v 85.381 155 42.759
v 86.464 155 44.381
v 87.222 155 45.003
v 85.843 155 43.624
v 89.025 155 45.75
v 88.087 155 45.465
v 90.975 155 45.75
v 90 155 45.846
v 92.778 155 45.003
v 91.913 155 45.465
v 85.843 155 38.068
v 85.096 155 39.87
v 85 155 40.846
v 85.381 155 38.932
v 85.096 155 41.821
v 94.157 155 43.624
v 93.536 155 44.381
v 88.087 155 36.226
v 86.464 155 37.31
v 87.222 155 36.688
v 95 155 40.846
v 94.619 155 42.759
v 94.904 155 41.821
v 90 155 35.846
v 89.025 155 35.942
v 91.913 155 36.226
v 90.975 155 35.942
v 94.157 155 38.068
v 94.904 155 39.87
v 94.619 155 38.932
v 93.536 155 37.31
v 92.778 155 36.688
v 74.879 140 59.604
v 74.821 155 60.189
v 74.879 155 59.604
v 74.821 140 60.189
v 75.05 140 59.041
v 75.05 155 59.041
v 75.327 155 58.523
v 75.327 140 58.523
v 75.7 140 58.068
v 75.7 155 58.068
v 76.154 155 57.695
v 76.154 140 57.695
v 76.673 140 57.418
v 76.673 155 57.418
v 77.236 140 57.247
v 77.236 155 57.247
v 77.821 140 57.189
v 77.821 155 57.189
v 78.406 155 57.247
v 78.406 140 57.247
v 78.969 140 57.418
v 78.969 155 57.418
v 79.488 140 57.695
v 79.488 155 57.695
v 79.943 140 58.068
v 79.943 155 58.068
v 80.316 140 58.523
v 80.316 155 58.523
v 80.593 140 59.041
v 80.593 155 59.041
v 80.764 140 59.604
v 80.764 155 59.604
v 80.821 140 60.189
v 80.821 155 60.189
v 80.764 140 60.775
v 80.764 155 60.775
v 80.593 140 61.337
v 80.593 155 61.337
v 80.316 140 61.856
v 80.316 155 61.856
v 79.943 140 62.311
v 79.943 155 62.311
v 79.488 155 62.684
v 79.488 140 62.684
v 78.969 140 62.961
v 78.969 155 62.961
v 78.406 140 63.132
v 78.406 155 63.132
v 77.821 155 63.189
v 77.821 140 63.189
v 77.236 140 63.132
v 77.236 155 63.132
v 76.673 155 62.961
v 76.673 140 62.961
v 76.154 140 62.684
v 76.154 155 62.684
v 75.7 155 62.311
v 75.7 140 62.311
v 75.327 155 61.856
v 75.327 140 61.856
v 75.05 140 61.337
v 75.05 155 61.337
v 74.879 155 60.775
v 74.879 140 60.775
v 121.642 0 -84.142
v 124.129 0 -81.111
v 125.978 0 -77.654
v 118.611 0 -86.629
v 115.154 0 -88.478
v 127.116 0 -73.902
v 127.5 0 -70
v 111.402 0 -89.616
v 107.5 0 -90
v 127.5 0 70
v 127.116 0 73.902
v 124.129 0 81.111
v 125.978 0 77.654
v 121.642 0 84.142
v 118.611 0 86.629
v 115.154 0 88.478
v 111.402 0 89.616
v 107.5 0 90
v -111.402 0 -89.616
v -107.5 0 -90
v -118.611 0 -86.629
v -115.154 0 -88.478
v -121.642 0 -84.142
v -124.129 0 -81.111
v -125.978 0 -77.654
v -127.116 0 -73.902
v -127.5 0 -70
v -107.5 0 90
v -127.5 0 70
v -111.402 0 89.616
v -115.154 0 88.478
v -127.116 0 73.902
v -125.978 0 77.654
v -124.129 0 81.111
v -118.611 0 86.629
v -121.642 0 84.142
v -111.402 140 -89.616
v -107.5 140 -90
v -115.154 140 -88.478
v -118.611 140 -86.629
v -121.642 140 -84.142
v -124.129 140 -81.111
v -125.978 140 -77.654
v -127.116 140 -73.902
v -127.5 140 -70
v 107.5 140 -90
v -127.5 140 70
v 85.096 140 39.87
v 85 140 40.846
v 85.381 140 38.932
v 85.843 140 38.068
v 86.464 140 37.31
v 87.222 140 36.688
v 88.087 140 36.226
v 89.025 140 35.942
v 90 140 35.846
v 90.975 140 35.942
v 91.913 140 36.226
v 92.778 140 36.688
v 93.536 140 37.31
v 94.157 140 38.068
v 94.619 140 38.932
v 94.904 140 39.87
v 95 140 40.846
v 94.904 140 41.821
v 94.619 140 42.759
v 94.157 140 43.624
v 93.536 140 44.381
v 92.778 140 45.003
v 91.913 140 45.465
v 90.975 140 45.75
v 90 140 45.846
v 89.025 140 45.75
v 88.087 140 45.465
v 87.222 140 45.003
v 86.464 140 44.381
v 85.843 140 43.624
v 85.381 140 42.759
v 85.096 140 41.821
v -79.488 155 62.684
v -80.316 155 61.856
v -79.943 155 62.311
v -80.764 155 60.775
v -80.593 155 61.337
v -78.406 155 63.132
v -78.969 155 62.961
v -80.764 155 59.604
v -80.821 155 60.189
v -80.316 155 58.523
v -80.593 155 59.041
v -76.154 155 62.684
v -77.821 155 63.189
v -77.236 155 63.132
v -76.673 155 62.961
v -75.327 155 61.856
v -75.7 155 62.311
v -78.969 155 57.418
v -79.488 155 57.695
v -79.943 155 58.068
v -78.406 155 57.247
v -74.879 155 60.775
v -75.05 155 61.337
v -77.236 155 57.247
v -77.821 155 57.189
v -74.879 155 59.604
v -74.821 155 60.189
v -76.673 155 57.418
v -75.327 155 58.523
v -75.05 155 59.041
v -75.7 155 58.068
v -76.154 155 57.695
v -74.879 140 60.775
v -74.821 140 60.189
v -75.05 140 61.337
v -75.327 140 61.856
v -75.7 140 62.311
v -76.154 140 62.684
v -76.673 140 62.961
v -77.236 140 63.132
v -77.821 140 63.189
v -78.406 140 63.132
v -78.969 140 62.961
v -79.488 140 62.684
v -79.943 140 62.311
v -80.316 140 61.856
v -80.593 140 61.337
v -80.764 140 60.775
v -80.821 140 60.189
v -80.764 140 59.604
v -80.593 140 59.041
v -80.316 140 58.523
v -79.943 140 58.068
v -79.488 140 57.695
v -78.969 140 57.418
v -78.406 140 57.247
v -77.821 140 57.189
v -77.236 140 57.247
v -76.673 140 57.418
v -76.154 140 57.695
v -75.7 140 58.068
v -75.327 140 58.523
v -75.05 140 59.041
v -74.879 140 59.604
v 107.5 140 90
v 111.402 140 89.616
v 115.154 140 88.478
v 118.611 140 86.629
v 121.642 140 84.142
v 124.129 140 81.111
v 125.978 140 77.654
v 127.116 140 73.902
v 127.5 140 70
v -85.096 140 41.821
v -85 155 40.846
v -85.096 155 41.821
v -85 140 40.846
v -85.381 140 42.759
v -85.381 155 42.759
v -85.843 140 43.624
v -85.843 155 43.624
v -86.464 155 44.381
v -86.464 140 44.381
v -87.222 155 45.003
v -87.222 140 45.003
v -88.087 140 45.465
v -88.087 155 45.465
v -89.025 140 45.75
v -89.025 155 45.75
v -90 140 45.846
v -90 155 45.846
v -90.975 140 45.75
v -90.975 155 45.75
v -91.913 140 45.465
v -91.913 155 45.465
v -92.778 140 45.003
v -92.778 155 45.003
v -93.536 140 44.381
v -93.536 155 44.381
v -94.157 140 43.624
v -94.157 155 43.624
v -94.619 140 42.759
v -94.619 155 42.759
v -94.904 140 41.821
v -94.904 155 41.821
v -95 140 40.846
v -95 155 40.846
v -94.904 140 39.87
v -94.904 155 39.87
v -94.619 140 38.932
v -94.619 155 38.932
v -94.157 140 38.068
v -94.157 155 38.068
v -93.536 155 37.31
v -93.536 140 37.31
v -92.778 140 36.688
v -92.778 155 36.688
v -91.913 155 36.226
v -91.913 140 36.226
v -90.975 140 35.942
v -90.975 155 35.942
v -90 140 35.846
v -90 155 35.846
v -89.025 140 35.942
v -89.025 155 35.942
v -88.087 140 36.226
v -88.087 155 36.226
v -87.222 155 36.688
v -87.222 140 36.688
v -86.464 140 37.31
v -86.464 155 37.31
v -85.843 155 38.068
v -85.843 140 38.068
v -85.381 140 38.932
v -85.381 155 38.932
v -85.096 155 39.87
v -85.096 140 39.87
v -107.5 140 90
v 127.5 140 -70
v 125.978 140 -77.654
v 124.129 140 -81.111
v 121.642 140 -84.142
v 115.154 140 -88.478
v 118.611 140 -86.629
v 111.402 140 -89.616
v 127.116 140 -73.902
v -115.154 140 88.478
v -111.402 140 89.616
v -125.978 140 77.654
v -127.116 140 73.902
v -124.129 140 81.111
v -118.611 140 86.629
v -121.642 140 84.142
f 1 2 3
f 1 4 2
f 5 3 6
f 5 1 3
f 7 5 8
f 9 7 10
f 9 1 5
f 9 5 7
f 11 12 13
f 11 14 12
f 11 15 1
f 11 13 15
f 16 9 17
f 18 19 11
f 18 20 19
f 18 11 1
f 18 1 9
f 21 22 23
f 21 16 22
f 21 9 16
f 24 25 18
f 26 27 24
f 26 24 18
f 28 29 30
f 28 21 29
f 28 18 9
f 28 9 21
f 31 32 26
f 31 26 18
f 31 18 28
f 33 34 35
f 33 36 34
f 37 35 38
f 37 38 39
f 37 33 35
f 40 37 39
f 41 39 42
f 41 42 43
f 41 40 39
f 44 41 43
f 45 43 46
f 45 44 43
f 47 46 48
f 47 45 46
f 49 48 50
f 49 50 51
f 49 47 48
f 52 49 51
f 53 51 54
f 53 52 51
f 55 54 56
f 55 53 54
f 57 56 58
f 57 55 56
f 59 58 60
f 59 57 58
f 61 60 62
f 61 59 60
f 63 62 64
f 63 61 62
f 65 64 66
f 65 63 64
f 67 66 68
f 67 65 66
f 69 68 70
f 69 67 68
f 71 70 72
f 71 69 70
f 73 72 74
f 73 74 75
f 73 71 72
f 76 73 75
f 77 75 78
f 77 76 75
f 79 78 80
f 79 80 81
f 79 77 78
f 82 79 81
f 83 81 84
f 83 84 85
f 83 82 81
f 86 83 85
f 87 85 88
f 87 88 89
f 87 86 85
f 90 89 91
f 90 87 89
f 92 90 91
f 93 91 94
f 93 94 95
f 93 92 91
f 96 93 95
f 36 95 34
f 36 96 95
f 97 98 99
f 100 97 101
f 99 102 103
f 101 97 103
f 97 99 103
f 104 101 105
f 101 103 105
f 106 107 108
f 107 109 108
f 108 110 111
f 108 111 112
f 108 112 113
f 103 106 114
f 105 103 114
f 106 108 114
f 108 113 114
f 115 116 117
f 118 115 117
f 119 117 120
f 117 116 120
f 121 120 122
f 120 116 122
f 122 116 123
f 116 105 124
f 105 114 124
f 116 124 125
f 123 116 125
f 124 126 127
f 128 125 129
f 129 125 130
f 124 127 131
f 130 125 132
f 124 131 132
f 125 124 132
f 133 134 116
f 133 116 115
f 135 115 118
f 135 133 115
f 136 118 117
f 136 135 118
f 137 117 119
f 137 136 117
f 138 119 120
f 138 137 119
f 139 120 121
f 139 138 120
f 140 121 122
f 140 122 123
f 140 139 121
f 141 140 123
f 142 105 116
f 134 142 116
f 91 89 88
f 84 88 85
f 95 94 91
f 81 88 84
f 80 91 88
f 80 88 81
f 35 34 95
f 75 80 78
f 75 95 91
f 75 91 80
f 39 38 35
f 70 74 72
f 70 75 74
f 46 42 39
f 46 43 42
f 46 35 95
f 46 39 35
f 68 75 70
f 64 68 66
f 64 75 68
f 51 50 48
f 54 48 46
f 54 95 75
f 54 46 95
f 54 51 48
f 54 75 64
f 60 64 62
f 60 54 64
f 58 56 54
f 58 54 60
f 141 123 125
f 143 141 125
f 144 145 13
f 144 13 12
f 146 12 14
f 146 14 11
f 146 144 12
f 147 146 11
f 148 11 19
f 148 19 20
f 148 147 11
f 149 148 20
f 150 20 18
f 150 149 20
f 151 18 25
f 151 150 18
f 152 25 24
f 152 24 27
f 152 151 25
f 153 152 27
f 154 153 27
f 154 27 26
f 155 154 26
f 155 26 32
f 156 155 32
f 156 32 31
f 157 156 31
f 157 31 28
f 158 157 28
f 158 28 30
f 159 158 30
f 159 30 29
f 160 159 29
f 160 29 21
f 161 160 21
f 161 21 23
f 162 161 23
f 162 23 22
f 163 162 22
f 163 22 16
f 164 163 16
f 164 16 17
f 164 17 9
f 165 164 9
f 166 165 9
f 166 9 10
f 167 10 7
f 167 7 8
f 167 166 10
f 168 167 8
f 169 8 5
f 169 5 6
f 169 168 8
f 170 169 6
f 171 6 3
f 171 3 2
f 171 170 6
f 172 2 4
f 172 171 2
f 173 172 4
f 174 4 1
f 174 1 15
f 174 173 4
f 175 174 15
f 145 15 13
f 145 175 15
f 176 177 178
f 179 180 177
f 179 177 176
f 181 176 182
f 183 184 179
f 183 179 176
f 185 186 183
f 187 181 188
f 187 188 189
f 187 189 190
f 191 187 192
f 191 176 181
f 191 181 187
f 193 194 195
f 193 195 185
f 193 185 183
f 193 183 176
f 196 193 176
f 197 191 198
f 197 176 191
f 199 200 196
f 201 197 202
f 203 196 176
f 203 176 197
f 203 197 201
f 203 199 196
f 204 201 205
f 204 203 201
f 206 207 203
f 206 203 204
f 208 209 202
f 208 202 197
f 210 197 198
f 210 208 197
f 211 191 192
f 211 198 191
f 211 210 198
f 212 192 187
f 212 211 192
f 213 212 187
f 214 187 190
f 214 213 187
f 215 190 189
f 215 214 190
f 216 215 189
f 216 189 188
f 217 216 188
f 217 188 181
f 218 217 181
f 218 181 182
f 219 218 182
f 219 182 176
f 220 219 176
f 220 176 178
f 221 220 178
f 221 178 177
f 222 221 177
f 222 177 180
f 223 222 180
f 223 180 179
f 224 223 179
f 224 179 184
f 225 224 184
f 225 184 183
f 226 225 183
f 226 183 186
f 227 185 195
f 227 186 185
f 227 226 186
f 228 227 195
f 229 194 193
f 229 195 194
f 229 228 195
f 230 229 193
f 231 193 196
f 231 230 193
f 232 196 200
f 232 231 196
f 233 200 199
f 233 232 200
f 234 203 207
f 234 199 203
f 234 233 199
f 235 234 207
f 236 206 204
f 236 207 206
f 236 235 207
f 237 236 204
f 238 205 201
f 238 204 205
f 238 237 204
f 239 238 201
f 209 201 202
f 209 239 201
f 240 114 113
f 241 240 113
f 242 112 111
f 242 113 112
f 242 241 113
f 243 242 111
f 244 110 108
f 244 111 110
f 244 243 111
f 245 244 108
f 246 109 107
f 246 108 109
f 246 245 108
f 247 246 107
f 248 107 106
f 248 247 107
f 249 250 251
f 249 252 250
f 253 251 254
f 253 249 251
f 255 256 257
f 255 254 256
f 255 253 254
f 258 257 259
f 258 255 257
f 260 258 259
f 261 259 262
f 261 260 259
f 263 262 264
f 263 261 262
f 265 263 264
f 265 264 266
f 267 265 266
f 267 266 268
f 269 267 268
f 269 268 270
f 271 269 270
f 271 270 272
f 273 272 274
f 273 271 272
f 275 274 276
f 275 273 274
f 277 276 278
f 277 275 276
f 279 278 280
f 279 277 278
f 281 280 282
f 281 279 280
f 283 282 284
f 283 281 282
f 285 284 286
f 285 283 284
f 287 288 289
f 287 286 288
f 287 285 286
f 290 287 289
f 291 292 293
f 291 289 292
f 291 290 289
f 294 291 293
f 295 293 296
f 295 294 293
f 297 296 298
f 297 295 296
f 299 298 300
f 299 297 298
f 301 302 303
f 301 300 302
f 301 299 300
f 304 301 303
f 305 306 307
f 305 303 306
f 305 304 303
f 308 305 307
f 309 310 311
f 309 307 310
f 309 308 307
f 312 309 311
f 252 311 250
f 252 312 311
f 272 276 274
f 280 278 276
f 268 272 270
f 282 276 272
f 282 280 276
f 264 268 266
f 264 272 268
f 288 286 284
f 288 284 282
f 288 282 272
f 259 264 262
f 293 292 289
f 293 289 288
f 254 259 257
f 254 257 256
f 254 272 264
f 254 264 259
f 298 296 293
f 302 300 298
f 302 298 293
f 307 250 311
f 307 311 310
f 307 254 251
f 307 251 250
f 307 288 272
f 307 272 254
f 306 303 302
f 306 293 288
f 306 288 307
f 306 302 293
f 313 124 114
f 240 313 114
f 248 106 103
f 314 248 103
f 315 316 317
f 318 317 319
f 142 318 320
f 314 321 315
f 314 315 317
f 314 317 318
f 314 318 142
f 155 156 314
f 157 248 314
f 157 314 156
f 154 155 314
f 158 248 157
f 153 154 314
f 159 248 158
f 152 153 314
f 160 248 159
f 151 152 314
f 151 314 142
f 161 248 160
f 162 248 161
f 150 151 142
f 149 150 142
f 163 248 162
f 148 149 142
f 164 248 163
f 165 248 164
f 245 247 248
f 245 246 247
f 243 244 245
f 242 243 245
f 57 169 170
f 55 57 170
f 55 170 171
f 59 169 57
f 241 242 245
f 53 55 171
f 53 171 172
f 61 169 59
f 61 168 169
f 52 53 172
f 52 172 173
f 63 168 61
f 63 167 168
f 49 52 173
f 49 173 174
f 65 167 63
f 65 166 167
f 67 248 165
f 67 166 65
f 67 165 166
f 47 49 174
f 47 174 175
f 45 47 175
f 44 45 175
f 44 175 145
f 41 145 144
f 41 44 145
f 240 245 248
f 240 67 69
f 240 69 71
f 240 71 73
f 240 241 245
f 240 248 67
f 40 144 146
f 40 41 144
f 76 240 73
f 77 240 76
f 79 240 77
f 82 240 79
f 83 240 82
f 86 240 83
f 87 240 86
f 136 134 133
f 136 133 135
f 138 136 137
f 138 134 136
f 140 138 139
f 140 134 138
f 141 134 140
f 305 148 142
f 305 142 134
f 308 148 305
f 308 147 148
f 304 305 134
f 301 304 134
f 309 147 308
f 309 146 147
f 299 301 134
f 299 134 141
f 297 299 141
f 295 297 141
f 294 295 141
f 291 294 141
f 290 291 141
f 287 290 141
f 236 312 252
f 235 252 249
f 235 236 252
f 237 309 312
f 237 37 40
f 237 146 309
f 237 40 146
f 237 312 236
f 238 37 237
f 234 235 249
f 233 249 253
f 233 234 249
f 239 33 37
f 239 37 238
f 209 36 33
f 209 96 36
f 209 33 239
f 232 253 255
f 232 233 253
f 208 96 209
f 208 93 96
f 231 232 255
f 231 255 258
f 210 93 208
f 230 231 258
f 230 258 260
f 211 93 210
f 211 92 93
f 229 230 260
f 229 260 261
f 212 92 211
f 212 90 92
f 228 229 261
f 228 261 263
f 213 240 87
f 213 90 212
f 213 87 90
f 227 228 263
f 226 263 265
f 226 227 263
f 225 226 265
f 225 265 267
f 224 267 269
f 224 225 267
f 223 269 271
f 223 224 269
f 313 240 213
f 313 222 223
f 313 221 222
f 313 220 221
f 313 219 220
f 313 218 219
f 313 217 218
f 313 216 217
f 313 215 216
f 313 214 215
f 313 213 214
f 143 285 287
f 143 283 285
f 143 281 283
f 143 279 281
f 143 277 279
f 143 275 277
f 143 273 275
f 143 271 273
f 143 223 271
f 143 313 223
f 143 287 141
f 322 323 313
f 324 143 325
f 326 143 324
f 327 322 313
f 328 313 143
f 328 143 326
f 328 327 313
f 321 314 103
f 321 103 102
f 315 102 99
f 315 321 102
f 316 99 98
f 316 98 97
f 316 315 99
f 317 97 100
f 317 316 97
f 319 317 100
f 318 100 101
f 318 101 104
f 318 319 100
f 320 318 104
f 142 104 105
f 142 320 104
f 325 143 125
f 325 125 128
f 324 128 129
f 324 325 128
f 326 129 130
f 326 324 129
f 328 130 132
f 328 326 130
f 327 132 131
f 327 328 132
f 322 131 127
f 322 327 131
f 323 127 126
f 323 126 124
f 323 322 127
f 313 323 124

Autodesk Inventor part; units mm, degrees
ref_plane "YZ Plane" through (0, 0, 0) normal (1, 0, 0) x (0, 1, 0)
ref_plane "XZ Plane" through (0, 0, 0) normal (0, 1, 0) x (-1, 0, 0)
ref_plane "XY Plane" through (0, 0, 0) normal (0, 0, 1) x (1, 0, 0)
sketch "Sketch1" plane through (0, 0, 0) normal (0, 1, 0) x (-1, 0, 0)
  line L0 (127.5, 90) -> (-127.5, 90)
  line L1 (-127.5, 90) -> (-127.5, -90)
  line L2 (-127.5, -90) -> (127.5, -90)
  line L3 (127.5, -90) -> (127.5, 90)
  line L4 (127.5, 90) -> (-127.5, -90) construction
  line L5 (-127.5, 90) -> (127.5, -90) construction
  point P0 (0, 0)
  dimension "d0" = 255
  dimension "d1" = 180
extrude "Extrusion1" add sketch "Sketch1" along normal blind 140
fillet "Face Fillet1" radius 20 1 edges at (127.5, 70, 90)
fillet "Face Fillet2" radius 20 1 edges at (127.5, 70, -90)
fillet "Face Fillet3" radius 20 1 edges at (-127.5, 70, -90)
fillet "Face Fillet4" radius 20 1 edges at (-127.5, 70, 90)
sketch "Sketch2" plane through (0, 140, 0) normal (0, 1, 0) x (1, 0, 0)
  line L0 (0, 0) -> (0, -90)
  line L1 (-107.5, -90) -> (107.5, -90) projected
  line L2 (-127.5, 70) -> (-127.5, -70) projected
  circle A0 centre (-90, -40.8457) radius 5
  circle A1 centre (-77.8212, -60.1893) radius 3
  dimension "d9" = 10
  dimension "d10" = 6
extrude "Extrusion2" add sketch "Sketch2" along normal blind 15
mirror "Mirror1" about plane through (0, 0, 0) normal (1, 0, 0) of "Extrusion2"
properties part number "Battery"
